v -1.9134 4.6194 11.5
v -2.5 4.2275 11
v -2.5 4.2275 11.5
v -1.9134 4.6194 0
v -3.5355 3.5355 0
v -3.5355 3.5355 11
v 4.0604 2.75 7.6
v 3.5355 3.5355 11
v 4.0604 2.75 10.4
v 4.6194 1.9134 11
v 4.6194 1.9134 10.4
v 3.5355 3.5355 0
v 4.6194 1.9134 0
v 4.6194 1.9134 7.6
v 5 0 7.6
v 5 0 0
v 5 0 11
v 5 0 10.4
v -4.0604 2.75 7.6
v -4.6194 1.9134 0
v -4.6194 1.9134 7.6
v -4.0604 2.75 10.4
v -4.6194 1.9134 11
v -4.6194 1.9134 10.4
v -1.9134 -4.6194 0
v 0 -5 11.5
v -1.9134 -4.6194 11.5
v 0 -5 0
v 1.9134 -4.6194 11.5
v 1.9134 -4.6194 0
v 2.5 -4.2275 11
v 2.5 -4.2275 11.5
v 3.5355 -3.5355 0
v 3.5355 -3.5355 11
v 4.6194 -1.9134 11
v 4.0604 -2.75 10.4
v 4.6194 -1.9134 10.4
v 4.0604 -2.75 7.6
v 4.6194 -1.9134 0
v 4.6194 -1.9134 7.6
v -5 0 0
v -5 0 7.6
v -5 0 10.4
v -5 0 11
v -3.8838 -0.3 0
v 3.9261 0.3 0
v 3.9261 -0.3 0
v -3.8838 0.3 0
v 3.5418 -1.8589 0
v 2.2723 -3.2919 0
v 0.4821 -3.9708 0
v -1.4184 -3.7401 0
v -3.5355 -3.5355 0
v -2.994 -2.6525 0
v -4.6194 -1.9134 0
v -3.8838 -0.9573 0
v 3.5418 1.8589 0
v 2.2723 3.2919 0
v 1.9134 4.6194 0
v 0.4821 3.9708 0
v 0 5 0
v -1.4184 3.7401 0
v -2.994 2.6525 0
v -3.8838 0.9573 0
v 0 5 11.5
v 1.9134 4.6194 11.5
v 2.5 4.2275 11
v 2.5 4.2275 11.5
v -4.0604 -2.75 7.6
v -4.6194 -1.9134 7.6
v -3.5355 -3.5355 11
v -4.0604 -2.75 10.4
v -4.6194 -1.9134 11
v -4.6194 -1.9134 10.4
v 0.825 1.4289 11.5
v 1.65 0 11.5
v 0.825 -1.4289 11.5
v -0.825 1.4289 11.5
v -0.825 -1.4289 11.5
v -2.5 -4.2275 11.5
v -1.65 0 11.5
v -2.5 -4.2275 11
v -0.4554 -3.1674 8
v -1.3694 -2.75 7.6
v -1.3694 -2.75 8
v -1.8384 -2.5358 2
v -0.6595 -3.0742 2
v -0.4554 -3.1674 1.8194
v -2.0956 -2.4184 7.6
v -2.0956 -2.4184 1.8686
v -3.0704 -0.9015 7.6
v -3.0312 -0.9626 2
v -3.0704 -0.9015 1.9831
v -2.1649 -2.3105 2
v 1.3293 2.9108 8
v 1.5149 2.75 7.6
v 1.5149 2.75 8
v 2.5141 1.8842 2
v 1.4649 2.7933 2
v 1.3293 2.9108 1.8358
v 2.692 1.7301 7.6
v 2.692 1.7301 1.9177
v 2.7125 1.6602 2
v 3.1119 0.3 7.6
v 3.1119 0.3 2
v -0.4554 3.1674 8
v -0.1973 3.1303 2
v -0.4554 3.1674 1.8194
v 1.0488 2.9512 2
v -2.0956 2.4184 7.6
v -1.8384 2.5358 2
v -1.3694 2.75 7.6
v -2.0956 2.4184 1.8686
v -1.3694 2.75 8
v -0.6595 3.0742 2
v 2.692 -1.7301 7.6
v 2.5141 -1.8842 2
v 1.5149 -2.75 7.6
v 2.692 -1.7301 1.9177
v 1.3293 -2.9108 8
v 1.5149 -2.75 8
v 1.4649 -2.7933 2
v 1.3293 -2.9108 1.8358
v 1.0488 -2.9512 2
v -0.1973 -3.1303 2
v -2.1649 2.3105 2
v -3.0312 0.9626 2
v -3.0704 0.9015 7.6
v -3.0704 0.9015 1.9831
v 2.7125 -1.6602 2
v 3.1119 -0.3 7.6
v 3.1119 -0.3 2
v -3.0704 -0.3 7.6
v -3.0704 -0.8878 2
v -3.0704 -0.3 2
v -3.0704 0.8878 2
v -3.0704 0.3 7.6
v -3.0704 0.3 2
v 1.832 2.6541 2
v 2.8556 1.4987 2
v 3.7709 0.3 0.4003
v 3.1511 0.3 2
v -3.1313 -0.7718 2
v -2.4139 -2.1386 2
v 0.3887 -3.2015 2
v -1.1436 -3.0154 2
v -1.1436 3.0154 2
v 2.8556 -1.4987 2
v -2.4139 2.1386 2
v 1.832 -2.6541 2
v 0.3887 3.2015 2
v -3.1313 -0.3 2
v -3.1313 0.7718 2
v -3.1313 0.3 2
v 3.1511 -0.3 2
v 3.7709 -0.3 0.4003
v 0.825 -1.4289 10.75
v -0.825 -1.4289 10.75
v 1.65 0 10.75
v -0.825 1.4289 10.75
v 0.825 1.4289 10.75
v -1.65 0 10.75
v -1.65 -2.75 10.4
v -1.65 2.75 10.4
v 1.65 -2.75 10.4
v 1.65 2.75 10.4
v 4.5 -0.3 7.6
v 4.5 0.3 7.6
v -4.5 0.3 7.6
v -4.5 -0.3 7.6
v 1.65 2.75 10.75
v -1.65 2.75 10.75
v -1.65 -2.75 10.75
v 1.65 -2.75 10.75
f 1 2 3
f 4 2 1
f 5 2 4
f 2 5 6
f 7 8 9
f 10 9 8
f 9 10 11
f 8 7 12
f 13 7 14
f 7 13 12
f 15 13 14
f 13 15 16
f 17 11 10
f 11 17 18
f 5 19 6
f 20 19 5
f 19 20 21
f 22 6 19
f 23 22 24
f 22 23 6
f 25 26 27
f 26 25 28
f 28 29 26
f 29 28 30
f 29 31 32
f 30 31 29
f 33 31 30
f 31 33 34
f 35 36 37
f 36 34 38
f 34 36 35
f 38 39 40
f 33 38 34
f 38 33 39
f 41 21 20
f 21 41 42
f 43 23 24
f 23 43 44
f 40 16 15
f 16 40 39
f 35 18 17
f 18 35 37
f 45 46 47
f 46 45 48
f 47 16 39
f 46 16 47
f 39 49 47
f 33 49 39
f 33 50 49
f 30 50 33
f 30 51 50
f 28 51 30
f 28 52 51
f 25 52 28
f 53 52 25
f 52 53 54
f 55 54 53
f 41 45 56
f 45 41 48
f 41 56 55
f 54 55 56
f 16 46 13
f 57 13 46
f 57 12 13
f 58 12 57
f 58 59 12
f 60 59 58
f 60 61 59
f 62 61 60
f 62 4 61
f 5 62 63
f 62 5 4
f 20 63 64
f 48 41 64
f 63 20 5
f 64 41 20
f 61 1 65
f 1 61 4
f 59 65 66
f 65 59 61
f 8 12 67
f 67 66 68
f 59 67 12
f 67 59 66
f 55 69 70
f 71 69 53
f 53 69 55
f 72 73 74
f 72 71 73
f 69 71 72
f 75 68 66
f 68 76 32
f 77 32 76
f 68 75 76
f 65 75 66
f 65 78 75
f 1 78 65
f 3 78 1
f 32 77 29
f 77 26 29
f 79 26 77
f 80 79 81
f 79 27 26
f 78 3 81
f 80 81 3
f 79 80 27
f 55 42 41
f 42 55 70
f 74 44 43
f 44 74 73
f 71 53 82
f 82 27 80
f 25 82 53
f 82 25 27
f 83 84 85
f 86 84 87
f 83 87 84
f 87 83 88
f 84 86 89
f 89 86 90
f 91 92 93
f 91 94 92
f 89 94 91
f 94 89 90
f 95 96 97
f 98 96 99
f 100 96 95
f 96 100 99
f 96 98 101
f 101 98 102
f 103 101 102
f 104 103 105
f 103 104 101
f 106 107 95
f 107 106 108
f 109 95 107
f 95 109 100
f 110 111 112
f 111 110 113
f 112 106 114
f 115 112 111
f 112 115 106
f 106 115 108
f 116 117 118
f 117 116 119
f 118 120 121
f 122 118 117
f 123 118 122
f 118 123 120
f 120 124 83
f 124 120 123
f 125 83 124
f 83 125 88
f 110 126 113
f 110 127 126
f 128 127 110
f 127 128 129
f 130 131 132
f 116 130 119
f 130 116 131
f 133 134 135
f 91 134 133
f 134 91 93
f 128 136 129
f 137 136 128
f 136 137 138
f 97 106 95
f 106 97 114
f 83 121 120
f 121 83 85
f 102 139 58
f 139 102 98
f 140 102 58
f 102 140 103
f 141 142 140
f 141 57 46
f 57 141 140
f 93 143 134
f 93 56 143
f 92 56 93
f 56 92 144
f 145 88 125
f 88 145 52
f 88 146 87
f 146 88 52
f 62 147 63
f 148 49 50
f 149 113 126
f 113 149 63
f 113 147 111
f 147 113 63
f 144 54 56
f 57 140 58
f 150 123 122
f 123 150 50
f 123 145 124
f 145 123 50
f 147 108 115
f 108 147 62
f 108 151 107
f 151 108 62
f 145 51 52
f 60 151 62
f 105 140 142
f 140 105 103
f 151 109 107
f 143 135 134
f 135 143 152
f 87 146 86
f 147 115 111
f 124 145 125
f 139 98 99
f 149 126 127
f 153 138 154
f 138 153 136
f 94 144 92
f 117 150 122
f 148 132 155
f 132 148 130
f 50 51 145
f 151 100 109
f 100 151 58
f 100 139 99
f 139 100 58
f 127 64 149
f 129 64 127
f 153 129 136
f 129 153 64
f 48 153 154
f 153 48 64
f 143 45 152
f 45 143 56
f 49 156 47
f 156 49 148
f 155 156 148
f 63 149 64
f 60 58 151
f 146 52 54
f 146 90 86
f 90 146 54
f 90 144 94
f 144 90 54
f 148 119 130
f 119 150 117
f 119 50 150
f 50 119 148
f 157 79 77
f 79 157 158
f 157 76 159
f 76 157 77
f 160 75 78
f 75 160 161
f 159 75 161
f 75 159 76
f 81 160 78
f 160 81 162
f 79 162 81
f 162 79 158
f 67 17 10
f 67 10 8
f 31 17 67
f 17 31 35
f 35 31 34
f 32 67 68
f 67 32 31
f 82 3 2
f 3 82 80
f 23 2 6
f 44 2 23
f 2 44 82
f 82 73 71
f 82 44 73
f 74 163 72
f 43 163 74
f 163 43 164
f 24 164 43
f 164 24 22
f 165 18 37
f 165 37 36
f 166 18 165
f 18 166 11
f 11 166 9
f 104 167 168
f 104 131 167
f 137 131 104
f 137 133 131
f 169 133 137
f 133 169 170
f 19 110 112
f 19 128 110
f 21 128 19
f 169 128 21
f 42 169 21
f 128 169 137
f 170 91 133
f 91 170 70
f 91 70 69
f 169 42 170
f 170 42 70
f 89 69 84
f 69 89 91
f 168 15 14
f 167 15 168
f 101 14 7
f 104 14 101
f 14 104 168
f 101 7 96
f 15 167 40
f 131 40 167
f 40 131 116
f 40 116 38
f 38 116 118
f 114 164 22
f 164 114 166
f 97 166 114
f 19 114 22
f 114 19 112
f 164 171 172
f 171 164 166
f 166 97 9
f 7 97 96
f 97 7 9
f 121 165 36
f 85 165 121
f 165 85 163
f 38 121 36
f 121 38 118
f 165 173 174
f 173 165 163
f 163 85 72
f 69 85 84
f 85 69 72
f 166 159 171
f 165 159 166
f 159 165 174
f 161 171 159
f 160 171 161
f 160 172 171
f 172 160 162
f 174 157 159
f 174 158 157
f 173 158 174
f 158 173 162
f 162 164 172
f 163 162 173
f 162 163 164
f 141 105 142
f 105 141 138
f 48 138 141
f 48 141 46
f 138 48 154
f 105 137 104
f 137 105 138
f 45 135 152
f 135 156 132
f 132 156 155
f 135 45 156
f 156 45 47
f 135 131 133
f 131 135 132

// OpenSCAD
//$fa = 6;
//$fs = 0.4;

encoder_grip();

module encoder_grip(){
    union(){
        difference(){
            union() {
                cylinder(d=10, h=11.5);
            }
            
            // grip the encoder
            cylinder(d=6.4, h=8);
            
            // chamfer for encoder
            cylinder(d1=8, d2=6.45, h=2);
            
            // screw hole
            cylinder(d=3.3, h=14);
            
            // key way
            translate([2.5,-6,11]) cube([12,12,12]);
            translate([-2.5-12,-6,11]) cube([12,12,12]);
            
            // captive nut
            translate([0,0,9]) cube([12,5.5,2.8], center=true);
            translate([0,0,9.5]) cube([3.3,5.5,2.5], center=true);
            
        }

        // encoder keyway
        translate([0,0,3.8]) cube([9,0.6,7.6], center=true);
    }
}
